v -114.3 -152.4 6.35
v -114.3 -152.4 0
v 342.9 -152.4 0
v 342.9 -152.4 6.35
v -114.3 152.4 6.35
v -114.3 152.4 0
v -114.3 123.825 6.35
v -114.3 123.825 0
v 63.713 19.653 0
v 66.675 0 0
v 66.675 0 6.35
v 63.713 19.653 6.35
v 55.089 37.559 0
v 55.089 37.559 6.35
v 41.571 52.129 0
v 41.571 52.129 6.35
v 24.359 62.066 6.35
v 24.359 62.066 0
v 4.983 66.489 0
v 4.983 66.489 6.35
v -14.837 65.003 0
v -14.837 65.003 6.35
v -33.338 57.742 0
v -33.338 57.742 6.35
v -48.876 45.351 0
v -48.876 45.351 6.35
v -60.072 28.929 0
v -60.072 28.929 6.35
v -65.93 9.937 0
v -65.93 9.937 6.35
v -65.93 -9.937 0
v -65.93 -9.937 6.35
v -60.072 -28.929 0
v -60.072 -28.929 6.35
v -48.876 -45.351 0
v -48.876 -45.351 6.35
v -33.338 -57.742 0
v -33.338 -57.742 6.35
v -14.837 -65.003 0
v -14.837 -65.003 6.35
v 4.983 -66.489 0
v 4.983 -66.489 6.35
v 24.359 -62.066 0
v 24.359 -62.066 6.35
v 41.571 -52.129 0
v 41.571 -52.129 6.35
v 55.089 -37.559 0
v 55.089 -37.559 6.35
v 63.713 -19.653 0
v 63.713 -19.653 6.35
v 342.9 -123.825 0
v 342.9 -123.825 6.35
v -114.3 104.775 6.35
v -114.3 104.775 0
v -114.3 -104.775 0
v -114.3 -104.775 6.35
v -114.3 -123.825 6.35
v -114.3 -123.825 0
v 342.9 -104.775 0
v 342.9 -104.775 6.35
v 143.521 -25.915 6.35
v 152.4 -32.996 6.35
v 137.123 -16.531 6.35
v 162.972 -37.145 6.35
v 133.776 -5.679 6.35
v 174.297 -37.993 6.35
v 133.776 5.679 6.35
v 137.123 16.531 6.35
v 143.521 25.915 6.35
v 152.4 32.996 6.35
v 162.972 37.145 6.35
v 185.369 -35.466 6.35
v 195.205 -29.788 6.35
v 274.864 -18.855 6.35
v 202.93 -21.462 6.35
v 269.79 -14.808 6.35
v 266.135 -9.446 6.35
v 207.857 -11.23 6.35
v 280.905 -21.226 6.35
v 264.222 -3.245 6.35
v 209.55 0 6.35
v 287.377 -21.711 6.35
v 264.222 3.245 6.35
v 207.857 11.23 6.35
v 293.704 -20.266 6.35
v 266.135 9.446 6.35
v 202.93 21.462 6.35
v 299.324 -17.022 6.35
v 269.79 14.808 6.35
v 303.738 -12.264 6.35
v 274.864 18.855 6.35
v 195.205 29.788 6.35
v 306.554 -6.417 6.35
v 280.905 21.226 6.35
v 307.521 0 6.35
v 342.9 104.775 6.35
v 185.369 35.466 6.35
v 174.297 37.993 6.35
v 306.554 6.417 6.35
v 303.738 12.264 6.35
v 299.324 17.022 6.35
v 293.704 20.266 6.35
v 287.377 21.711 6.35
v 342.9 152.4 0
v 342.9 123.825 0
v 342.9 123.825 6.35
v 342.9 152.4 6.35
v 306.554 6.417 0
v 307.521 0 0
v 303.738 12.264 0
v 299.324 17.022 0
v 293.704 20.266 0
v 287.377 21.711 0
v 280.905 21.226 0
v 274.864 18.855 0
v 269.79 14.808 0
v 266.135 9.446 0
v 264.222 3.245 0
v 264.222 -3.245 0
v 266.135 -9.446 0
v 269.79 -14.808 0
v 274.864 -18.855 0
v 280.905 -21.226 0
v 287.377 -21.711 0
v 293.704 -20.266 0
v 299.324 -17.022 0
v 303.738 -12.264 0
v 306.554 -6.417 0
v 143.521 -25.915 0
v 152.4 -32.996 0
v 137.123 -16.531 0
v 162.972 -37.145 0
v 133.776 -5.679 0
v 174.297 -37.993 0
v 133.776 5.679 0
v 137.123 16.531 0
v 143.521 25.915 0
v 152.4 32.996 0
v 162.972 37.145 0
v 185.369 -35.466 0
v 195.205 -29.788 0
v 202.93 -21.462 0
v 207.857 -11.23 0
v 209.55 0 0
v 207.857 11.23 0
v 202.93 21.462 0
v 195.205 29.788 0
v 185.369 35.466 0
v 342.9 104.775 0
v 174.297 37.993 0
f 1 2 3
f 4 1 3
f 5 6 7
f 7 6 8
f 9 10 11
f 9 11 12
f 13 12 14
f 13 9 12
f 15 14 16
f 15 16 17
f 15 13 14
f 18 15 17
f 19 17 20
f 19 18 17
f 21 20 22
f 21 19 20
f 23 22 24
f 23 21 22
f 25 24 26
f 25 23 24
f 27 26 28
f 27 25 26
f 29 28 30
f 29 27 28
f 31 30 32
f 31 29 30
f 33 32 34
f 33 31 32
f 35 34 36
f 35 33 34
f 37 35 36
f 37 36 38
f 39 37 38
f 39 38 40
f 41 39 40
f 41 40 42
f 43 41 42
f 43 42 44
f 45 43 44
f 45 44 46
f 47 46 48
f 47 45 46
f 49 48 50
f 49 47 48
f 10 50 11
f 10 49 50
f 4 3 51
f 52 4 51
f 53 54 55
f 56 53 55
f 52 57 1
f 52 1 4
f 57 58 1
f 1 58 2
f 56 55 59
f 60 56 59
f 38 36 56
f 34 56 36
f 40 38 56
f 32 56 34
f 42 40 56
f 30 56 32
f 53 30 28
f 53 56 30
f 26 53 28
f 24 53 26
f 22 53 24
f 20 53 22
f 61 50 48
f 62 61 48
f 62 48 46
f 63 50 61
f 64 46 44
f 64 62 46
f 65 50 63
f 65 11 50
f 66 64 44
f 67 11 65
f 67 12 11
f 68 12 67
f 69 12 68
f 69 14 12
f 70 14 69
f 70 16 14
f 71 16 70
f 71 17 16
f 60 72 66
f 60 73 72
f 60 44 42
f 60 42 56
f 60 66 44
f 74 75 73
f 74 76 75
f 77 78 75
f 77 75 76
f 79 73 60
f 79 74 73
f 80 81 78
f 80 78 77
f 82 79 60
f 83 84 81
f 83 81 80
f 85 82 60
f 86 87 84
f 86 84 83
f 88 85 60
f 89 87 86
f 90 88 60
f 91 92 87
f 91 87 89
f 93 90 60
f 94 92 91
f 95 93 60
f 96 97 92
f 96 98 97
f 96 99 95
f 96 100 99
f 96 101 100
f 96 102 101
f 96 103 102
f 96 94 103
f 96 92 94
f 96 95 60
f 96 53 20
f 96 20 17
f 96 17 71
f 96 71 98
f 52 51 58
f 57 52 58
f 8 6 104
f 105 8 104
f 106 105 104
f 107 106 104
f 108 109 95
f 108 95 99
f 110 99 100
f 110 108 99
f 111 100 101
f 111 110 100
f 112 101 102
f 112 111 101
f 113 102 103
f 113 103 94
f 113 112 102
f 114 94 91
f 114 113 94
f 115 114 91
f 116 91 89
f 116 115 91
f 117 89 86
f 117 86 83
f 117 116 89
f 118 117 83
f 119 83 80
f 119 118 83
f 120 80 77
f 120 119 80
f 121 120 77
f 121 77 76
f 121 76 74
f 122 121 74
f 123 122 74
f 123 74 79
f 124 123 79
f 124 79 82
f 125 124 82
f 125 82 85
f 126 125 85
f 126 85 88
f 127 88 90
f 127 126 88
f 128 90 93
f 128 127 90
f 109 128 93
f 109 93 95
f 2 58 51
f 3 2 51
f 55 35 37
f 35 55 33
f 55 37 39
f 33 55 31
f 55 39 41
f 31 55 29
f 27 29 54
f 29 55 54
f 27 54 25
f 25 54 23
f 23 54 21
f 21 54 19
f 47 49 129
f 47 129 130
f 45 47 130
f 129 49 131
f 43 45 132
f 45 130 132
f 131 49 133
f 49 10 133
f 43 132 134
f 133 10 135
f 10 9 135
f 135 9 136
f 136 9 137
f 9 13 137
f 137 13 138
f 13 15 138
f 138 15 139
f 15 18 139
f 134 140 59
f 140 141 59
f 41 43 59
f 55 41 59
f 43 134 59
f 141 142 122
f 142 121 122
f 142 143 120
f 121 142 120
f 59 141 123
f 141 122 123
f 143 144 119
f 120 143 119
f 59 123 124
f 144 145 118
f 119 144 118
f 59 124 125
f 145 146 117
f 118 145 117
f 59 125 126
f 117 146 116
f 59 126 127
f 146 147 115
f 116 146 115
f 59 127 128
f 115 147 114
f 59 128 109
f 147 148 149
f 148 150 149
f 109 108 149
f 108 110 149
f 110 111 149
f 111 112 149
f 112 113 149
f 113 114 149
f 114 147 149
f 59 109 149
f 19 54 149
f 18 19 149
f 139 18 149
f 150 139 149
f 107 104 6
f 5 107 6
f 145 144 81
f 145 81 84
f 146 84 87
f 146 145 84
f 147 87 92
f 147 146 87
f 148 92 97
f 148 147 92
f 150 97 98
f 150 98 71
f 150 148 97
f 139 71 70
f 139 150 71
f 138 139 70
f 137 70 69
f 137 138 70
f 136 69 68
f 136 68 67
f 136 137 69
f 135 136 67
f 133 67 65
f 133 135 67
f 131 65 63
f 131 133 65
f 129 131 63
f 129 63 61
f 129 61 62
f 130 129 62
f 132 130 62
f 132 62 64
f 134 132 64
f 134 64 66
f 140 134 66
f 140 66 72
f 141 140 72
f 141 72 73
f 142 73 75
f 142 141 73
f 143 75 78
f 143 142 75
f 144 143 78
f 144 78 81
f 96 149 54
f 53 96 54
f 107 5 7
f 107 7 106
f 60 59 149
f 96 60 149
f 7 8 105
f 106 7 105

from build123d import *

# Parameters (mm, degrees)
F0_R     = 66.675
F0_R_2   = 73.025
F1_DEPTH = 6.35
F0_R_3   = 38.1
F0_R_4   = 21.771429
F2_DEPTH = 6.35


with BuildPart() as f1:
    # F0 (on Top) → F1 (new body)
    with BuildSketch(Plane.XY):
        Circle(F0_R)
        Circle(F0_R_2)
        Circle(F0_R, mode=Mode.SUBTRACT)
    extrude(amount=F1_DEPTH)

    # F0 (on Top) → F2 (join)
    with BuildSketch(Plane.XY):
        Polygon((342.900002, 104.775001), (-114.3, 104.775001), (-114.3, -104.774999), (342.900008, -104.774999), align=None)
        Circle(F0_R_2, mode=Mode.SUBTRACT)
        with Locations((171.45, 2e-06)):
            Circle(F0_R_3, mode=Mode.SUBTRACT)
        with Locations((285.75, 4e-06)):
            Circle(F0_R_4, mode=Mode.SUBTRACT)
        Polygon((342.900009, -123.824999), (-114.3, -123.824999), (-114.3, -152.399999), (104.922128, -152.399999), (342.90001, -152.399999), align=None)
        Polygon((107.95, 152.400001), (-114.3, 152.400001), (-114.3, 123.825001), (342.900001, 123.825001), (342.9, 152.400001), align=None)
    extrude(amount=F2_DEPTH)


solid = f1.part
